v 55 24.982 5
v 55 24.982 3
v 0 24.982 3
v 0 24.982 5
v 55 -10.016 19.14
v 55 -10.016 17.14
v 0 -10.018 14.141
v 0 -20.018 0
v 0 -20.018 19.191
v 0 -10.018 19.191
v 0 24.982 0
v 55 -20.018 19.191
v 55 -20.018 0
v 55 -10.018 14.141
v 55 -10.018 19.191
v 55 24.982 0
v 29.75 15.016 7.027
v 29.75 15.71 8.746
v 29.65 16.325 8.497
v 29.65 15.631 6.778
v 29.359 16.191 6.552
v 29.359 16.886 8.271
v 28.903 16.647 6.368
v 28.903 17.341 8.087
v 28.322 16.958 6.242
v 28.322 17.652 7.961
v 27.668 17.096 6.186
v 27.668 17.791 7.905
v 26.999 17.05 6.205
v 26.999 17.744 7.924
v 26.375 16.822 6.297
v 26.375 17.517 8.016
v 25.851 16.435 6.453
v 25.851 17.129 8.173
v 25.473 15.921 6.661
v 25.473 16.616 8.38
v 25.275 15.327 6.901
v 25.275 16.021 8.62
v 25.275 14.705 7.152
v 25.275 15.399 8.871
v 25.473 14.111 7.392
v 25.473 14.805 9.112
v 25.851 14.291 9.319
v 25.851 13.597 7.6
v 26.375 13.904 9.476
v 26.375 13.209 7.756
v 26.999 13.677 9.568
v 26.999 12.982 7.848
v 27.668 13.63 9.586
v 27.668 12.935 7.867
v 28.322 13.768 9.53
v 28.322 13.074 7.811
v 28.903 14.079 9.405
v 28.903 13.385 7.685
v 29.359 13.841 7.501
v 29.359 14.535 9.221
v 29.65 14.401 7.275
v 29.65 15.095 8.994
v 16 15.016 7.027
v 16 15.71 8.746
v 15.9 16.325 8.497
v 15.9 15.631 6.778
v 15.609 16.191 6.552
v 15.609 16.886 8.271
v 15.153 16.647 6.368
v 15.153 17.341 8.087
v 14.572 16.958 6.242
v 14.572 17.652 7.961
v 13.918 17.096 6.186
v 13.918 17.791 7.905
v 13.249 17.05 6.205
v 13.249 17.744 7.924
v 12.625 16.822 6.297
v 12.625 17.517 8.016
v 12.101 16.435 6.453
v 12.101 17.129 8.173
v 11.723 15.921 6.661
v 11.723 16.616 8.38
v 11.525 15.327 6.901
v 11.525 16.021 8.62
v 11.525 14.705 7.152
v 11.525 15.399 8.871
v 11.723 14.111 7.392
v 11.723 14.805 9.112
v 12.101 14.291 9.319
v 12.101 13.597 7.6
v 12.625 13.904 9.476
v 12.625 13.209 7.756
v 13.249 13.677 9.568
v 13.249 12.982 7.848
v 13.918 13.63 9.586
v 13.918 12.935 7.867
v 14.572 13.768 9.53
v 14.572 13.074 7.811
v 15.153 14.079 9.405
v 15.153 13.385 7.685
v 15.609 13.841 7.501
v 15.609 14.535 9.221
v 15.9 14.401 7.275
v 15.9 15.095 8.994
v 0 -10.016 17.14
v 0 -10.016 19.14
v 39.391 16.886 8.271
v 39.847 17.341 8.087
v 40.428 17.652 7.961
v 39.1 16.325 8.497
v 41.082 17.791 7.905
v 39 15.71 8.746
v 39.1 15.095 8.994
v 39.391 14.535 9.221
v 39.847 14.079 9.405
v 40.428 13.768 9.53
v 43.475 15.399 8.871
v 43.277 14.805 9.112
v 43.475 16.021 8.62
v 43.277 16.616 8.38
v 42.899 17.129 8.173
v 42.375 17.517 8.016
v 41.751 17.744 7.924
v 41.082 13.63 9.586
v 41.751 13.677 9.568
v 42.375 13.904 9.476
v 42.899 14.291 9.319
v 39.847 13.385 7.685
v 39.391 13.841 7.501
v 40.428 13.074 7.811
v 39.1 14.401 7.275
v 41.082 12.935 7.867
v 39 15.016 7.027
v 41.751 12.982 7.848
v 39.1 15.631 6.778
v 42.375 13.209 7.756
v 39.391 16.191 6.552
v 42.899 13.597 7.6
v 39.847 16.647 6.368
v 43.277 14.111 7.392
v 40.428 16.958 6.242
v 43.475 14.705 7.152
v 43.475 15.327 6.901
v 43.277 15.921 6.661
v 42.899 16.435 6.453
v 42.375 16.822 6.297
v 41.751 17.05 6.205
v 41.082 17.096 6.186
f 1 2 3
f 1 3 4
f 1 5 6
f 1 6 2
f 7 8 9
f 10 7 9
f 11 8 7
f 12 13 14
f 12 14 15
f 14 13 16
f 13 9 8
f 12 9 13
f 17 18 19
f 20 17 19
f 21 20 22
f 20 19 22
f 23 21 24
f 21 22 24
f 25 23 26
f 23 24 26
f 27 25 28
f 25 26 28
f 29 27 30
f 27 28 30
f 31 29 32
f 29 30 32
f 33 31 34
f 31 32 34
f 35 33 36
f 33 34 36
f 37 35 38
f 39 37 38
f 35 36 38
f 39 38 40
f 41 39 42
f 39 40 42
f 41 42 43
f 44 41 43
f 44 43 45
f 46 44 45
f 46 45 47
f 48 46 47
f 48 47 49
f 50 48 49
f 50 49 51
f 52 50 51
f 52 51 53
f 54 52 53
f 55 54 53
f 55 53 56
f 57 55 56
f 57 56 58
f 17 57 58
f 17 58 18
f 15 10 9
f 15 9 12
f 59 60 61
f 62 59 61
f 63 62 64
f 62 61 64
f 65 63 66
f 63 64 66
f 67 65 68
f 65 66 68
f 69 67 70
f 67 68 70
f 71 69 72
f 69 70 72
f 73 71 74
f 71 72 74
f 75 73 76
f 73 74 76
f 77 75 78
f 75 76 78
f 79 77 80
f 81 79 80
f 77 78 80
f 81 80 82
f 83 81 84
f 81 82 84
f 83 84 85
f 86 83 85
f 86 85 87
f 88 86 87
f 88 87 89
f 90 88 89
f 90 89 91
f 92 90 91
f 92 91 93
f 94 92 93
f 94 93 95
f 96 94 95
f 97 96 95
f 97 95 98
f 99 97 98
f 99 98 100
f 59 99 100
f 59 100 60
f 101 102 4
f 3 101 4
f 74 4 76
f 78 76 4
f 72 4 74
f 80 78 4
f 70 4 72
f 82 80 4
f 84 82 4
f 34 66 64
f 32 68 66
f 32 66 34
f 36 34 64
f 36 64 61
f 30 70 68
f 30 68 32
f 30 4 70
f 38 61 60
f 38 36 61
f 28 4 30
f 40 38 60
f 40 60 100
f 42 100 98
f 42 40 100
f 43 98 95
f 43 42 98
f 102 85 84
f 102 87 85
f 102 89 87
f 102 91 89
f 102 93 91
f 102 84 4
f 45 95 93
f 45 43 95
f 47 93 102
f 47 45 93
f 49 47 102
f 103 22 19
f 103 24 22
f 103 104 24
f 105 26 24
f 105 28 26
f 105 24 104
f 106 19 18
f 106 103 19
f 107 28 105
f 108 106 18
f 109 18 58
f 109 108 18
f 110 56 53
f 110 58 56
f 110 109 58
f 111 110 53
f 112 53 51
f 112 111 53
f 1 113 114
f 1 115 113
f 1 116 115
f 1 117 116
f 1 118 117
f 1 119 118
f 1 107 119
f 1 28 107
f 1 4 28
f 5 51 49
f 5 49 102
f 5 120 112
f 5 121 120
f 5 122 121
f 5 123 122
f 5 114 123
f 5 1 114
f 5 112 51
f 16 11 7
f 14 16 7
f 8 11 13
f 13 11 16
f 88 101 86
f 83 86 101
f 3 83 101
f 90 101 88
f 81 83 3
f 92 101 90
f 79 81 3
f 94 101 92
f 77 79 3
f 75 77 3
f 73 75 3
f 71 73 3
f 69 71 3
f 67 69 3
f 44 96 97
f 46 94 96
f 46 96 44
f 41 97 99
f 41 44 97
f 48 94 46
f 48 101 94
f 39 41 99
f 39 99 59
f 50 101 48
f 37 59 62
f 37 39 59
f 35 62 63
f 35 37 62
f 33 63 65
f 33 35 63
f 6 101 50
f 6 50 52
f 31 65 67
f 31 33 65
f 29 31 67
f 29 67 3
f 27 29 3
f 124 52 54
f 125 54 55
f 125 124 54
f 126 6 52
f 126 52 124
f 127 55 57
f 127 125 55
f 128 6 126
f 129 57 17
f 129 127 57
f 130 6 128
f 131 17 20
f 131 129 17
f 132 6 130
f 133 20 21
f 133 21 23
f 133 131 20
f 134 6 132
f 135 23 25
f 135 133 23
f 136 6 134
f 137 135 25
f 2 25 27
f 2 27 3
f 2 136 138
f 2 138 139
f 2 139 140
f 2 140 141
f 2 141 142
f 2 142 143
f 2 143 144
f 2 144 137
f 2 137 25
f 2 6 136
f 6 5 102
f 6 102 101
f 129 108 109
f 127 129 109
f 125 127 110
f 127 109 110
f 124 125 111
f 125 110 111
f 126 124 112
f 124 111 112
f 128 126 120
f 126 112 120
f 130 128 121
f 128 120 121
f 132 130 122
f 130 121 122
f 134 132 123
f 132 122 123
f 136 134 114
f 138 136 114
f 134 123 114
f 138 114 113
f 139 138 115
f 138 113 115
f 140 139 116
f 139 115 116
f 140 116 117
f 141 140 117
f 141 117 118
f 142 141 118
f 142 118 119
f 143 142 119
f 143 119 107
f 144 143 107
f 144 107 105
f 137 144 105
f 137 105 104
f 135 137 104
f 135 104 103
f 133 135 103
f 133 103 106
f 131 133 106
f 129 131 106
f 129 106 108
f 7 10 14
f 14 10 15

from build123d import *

# Parameters (mm, degrees)
F1_DEPTH = 55
F5_DEPTH = 55
F6_W     = 55
F6_H     = 19.191428078
F7_DEPTH = 10
F8_R     = 2.25
F9_DEPTH = 25


with BuildPart() as f1:
    # F0 (on Right) → F1 (new body)
    with BuildSketch(Plane.YZ):
        Polygon((24.9822678417, 0), (-10.0177321583, 14.1409179042), (-10.0177321583, 0), align=None)
    extrude(amount=F1_DEPTH)

    # F6 (on face) → F7 (join)
    with BuildSketch(Plane.XZ.offset(10.0177321583)):
        with Locations((27.5, 9.595714039)):
            Rectangle(F6_W, F6_H)
    extrude(amount=F7_DEPTH)


with BuildPart() as f5:
    # F4 (on face) → F5 (new body)
    with BuildSketch(Plane.YZ.offset(55)):
        Polygon((-10.016492568, 19.1397086233), (-10.016492568, 17.1397086233), (24.9822754413, 2.9999588151), (24.9822754413, 4.9999588151), align=None)
    extrude(amount=-F5_DEPTH)

    # F8 (on face) → F9 (cut)
    with BuildSketch(Plane(origin=(0, 5.242051865, 12.9751487547), x_dir=(1, 0, 0), z_dir=(0, 0.3745913268, 0.9271900225))):
        with Locations((13.75, 11.2903753235)):
            Circle(F8_R)
        with BuildLine():
            ThreePointArc((25.25, 11.2903753235), (27.5, 9.0403753235), (29.75, 11.2903753235))
            Line((29.75, 11.2903753235), (27.5, 11.2903753235))
            Line((27.5, 11.2903753235), (25.25, 11.2903753235))
        make_face()
        with BuildLine():
            Line((27.5, 11.2903753235), (29.75, 11.2903753235))
            ThreePointArc((29.75, 11.2903753235), (27.5, 13.5403753235), (25.25, 11.2903753235))
            Line((25.25, 11.2903753235), (27.5, 11.2903753235))
        make_face()
        with BuildLine():
            ThreePointArc((43.5, 11.2903753235), (41.25, 13.5403753235), (39, 11.2903753235))
            ThreePointArc((39, 11.2903753235), (41.25, 9.0403753235), (43.5, 11.2903753235))
        make_face()
    extrude(amount=-F9_DEPTH, mode=Mode.SUBTRACT)


solid = Compound([f1.part, f5.part])
